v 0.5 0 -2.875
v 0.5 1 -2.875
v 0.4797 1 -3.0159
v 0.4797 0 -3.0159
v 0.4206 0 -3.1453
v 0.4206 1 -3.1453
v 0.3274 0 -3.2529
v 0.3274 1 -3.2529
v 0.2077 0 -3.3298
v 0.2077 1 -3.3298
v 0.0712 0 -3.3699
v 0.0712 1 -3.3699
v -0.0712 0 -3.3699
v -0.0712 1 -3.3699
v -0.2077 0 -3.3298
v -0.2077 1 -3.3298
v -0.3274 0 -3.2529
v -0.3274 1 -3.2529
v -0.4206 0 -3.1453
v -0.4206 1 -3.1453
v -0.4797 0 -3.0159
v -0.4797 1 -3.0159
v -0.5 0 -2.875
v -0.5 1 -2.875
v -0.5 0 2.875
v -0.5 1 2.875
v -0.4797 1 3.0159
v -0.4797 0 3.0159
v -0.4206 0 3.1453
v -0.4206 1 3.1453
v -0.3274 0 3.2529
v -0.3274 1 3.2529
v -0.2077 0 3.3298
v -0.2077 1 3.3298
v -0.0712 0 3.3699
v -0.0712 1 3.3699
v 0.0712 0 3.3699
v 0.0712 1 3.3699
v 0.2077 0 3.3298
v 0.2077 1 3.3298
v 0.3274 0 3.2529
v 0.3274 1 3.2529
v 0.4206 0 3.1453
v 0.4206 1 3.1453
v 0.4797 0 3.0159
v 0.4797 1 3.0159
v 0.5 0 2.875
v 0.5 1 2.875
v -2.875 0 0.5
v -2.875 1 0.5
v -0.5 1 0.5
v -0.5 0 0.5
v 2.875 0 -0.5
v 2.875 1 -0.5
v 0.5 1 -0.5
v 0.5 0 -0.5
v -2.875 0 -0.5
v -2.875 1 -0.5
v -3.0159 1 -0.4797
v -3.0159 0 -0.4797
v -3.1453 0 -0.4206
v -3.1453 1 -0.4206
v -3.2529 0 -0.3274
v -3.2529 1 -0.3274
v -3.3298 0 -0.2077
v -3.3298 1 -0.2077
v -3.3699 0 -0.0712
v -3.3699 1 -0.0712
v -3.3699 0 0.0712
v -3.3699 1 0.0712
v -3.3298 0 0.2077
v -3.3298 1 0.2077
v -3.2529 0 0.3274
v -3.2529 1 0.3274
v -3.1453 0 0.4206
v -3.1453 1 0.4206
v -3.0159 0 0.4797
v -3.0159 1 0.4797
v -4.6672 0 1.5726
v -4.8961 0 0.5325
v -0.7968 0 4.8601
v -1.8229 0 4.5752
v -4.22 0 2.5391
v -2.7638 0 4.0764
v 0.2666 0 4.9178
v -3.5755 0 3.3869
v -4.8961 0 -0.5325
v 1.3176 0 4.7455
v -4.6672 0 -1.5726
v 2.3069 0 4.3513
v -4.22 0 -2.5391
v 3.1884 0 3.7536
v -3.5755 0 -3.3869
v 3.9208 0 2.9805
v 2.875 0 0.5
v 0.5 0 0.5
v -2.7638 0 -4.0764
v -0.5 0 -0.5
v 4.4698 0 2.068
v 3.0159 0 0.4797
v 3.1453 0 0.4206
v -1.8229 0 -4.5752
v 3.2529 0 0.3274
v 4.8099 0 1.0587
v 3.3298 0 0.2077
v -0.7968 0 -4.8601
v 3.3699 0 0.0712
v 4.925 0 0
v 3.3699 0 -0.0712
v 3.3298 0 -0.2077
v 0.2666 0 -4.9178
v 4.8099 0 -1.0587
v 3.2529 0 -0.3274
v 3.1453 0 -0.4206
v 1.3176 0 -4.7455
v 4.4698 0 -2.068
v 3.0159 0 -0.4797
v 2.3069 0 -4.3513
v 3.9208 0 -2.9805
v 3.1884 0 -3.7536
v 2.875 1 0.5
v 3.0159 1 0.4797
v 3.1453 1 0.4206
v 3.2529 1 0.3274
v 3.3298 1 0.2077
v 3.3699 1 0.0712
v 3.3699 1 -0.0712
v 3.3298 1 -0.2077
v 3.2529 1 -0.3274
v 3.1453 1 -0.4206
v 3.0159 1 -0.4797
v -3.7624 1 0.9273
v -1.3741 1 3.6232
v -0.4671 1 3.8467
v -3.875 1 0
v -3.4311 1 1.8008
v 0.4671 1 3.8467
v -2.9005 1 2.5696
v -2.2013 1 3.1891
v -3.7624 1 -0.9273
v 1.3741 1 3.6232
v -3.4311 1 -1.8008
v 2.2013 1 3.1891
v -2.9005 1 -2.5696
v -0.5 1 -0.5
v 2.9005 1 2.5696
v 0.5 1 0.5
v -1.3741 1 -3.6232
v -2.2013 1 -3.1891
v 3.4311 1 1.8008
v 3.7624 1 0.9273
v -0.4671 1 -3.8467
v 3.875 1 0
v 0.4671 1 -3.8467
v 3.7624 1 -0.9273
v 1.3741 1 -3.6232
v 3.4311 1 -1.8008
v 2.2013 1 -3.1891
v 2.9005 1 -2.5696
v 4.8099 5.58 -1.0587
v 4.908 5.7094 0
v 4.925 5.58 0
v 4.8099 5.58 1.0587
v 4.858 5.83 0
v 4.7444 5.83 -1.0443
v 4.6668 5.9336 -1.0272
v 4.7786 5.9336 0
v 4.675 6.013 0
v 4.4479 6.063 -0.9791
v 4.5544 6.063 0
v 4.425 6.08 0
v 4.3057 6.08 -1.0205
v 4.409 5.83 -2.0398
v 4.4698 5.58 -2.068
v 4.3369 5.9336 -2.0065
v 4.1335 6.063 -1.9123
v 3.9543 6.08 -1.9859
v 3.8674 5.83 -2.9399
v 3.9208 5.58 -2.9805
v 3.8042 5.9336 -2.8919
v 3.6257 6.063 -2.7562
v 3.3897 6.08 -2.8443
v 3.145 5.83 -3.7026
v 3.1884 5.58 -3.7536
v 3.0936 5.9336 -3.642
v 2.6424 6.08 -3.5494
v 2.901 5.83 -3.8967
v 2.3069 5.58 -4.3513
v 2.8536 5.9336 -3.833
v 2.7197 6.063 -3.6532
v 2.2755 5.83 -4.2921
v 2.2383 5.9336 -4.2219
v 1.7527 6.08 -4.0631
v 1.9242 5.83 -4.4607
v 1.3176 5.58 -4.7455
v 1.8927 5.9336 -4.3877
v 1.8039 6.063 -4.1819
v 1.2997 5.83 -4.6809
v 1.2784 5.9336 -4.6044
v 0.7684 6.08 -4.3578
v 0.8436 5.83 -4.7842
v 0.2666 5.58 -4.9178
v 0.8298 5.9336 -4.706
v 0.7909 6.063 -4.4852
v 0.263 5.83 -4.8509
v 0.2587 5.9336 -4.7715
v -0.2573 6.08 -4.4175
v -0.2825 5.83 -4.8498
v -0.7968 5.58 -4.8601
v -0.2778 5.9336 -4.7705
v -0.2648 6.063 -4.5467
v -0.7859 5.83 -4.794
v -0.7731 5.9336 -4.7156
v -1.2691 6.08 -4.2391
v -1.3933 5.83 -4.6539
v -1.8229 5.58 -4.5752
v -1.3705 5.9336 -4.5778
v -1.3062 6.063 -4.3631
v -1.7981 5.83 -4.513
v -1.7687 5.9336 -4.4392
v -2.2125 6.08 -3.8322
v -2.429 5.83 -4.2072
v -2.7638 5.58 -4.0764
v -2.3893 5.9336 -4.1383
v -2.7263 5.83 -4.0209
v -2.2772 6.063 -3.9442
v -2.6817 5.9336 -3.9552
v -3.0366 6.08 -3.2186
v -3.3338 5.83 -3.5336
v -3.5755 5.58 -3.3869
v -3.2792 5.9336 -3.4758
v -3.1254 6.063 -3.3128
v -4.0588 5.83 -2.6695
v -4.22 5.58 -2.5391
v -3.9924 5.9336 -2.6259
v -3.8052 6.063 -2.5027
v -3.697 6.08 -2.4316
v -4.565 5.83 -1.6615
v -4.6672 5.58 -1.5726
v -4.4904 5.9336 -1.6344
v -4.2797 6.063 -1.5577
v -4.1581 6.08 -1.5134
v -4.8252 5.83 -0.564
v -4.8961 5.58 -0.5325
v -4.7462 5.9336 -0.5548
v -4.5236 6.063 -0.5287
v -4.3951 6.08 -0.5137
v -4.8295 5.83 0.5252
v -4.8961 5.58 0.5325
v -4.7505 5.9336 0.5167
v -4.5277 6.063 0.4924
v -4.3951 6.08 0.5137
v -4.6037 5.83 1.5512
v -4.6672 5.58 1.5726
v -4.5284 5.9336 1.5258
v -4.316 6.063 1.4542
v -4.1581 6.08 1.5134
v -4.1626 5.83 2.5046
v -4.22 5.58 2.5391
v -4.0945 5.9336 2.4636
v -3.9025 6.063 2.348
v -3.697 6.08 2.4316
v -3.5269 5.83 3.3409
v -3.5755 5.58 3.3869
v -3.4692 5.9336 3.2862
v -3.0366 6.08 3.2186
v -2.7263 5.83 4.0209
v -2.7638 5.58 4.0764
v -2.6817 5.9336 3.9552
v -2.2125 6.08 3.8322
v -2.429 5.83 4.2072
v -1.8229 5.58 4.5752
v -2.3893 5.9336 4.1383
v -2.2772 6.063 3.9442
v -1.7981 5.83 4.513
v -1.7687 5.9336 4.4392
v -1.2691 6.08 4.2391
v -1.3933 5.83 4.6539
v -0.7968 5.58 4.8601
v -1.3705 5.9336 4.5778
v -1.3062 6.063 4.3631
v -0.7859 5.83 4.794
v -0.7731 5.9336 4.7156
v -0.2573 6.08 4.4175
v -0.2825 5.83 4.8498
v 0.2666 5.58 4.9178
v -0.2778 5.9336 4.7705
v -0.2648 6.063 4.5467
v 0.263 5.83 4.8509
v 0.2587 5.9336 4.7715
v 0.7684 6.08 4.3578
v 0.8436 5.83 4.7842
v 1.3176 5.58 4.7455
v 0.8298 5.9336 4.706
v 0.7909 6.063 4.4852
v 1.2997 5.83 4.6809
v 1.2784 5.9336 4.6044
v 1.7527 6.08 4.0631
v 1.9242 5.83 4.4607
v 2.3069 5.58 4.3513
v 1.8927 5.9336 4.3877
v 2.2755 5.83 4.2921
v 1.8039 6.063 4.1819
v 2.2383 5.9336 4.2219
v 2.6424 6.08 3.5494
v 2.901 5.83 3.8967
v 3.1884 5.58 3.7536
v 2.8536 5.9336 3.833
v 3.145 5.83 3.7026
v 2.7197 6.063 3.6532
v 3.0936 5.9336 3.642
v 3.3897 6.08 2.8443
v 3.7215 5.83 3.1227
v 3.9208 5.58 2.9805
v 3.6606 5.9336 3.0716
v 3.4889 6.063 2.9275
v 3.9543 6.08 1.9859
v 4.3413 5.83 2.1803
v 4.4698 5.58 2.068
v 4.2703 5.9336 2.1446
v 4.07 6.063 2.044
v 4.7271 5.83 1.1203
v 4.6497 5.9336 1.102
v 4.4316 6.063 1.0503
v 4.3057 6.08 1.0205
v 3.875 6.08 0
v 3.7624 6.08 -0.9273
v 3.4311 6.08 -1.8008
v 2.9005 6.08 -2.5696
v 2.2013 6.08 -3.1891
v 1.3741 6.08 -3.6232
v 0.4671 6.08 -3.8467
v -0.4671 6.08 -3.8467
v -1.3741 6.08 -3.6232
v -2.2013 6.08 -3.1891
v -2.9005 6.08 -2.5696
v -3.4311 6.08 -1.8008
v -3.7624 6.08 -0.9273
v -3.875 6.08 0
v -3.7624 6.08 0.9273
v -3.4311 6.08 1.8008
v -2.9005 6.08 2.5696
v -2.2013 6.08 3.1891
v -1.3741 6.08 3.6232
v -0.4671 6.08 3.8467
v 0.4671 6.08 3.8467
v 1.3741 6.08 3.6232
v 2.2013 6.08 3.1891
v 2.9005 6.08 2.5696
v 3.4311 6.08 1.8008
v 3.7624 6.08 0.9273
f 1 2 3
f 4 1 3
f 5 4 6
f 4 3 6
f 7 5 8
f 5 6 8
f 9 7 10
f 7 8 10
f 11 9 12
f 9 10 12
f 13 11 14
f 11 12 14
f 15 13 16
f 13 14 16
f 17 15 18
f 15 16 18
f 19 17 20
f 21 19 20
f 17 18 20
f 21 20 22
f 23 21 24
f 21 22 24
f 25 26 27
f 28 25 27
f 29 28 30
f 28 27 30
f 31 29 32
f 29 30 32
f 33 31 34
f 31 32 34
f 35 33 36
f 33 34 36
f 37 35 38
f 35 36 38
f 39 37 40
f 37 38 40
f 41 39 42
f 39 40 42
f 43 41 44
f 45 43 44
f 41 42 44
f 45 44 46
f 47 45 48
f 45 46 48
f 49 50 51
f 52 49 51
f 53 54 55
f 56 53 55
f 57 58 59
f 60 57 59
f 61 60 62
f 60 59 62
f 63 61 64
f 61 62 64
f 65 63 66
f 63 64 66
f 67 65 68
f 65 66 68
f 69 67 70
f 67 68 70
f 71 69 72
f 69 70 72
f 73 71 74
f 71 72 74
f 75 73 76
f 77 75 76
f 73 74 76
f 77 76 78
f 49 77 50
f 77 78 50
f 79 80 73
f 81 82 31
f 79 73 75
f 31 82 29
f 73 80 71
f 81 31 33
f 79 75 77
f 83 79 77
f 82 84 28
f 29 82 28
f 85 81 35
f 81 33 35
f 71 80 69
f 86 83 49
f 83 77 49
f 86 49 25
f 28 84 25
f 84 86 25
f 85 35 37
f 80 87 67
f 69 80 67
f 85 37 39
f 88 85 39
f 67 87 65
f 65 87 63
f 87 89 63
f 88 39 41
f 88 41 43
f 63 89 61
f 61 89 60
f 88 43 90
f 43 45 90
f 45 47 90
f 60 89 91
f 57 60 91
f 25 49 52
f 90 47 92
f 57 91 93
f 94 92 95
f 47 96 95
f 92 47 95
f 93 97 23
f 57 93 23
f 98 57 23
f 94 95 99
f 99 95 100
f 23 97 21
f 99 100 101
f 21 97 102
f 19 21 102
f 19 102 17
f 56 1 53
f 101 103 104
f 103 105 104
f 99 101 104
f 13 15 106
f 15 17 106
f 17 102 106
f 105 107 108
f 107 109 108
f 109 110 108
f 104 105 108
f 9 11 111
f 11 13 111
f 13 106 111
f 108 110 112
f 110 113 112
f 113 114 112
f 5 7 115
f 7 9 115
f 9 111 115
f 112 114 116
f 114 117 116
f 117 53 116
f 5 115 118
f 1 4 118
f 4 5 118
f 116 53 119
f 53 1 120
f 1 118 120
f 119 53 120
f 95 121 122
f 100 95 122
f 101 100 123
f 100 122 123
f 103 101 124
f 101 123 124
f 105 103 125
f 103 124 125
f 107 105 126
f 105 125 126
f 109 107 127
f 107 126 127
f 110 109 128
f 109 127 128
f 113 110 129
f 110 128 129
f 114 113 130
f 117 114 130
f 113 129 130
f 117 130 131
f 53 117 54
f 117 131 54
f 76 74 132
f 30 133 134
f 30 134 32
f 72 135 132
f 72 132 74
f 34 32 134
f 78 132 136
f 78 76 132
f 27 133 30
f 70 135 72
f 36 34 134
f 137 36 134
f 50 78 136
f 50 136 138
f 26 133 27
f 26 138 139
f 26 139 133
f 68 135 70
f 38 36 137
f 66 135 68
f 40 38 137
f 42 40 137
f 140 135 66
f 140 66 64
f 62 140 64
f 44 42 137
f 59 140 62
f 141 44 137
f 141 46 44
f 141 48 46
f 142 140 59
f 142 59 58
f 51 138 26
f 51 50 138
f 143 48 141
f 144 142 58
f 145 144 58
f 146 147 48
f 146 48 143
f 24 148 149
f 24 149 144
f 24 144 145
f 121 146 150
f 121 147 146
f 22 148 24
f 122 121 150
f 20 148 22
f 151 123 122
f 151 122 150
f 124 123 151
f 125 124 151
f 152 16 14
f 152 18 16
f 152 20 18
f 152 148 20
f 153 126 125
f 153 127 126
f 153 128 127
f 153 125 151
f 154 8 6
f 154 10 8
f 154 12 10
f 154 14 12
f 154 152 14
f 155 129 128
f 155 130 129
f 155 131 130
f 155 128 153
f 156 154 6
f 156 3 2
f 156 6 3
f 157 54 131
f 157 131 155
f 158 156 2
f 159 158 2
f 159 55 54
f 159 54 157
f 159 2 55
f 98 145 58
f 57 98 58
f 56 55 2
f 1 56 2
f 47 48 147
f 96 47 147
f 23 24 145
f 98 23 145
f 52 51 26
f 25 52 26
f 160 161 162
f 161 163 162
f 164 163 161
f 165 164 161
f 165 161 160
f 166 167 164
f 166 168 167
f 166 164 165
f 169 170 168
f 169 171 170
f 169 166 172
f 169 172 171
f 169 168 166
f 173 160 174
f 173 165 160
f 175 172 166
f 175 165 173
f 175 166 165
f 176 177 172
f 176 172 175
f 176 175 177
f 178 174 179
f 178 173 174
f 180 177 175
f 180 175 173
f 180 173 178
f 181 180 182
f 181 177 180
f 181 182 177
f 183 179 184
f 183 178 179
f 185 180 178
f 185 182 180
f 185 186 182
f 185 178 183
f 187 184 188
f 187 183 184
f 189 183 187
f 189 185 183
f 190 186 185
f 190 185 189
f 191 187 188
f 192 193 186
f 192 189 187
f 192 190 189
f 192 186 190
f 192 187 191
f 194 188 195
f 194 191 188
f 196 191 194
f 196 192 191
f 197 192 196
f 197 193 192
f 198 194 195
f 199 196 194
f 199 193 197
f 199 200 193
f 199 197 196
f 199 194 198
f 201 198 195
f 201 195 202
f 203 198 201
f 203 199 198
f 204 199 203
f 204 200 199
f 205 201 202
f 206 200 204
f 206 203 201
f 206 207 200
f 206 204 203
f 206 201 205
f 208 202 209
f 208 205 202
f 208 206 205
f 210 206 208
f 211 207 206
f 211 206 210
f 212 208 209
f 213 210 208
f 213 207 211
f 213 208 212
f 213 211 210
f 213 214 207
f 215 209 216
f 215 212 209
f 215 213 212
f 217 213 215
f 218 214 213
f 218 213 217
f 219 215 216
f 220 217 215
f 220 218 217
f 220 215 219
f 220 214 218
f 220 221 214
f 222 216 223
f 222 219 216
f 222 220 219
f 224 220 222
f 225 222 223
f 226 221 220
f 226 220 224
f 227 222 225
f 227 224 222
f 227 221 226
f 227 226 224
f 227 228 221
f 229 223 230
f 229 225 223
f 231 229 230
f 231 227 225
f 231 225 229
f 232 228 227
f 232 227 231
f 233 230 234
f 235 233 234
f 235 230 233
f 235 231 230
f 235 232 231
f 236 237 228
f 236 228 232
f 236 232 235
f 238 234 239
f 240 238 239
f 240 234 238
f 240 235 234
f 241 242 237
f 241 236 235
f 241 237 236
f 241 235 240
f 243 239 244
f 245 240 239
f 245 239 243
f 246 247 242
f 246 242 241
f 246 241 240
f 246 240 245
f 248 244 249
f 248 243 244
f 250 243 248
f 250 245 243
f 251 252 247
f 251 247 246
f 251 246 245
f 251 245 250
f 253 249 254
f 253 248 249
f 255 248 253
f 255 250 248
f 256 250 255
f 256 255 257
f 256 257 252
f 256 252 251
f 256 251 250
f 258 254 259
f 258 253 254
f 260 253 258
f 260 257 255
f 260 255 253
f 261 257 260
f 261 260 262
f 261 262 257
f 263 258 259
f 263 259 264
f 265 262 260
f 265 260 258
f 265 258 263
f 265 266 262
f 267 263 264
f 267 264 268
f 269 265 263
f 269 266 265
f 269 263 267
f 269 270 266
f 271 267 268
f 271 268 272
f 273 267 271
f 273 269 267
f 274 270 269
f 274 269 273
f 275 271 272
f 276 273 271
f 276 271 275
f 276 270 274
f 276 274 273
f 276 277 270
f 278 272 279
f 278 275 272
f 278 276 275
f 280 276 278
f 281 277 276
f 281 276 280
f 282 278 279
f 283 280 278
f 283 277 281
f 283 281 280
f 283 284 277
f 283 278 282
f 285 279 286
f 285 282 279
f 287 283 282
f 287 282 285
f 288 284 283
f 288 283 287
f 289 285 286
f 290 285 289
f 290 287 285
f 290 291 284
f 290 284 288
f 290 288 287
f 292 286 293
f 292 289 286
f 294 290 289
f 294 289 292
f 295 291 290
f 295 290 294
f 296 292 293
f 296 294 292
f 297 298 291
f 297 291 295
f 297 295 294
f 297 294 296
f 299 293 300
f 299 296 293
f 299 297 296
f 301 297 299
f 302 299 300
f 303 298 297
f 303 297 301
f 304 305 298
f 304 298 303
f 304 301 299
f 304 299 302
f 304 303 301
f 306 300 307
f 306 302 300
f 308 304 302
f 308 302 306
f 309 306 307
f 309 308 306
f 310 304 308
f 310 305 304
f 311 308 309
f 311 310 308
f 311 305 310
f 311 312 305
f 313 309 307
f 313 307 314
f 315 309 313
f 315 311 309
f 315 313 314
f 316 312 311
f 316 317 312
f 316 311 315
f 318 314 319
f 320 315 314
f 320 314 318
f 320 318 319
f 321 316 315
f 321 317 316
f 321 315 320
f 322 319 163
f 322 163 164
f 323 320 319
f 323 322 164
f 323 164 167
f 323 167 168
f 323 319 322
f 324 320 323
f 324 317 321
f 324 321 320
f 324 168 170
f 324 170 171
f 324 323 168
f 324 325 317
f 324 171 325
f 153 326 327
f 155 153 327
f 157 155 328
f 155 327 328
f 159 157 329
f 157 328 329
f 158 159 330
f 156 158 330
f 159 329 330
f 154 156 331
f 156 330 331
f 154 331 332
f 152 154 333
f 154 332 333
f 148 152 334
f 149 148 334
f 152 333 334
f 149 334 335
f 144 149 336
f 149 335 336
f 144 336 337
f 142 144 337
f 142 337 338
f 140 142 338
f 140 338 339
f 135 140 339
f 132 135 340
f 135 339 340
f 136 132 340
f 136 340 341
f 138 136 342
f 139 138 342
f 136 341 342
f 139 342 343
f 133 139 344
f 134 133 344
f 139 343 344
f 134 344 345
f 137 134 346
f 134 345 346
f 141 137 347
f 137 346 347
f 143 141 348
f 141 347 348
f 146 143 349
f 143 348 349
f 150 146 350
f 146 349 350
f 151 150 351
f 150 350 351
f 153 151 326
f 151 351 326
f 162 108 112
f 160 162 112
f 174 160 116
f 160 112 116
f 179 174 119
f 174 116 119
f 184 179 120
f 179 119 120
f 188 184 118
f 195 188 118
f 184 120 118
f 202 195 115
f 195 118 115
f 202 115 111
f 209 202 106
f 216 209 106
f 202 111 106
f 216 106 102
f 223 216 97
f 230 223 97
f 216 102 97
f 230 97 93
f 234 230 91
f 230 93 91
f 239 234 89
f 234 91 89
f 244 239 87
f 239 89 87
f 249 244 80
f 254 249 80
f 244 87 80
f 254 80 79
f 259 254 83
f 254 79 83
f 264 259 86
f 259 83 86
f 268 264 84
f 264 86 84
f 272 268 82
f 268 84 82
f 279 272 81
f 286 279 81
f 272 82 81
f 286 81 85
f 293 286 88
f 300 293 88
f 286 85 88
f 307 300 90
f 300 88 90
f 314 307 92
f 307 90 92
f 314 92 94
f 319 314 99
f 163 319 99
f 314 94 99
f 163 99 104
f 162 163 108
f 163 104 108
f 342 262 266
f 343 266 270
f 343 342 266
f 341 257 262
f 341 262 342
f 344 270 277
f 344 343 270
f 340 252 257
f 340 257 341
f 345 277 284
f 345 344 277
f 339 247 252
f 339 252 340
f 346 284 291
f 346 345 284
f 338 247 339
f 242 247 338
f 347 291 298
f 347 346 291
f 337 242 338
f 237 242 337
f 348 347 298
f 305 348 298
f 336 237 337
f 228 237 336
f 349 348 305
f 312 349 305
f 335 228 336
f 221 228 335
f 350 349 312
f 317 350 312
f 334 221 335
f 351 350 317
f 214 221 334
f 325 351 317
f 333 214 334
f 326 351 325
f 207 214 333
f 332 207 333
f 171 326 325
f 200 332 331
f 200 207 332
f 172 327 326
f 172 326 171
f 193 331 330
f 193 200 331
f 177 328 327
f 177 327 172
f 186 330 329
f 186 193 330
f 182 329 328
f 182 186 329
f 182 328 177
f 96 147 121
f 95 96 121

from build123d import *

# Parameters (mm, degrees)
SKETCH_1_R          = 4.925
EXTRUDE_1_DEPTH     = 6.08
SKETCH_2_R          = 3.875
CUT_EXTRUDE_1_DEPTH = 5.08
FILLET_1_R          = 0.5
CUT_EXTRUDE_2_DEPTH = 2


with BuildPart() as part:
    # Эскиз1 → Бобышка-Вытянуть1 (new body)
    with BuildSketch(Plane(origin=(0, 0, 0), x_dir=(1, 0, 0), z_dir=(0, 1, 0))):
        Circle(SKETCH_1_R)
    extrude(amount=EXTRUDE_1_DEPTH)

    # Эскиз2 → Вырез-Вытянуть1 (cut)
    with BuildSketch(Plane(origin=(0, 6.08, 0), x_dir=(1, 0, 0), z_dir=(0, 1, 0))):
        Circle(SKETCH_2_R)
    extrude(amount=-CUT_EXTRUDE_1_DEPTH, mode=Mode.SUBTRACT)

    # Скругление1
    fillet_1_edges = [part.edges().sort_by_distance(p)[0] for p in [
        (-4.925, 6.08, 0),
    ]]
    fillet(fillet_1_edges, radius=FILLET_1_R)

    # Эскиз3 → Вырез-Вытянуть2 (cut, through all)
    with BuildSketch(Plane(origin=(0, 1, 0), x_dir=(1, 0, 0), z_dir=(0, 1, 0))):
        with BuildLine():
            Line((2.875, 0.5), (0.5, 0.5))
            Line((0.5, 0.5), (0.5, 2.875))
            ThreePointArc((0.5, 2.875), (0, 3.375), (-0.5, 2.875))
            Line((-0.5, 2.875), (-0.5, 0.5))
            Line((-0.5, 0.5), (-2.875, 0.5))
            ThreePointArc((-2.875, 0.5), (-3.375, 0), (-2.875, -0.5))
            Line((-2.875, -0.5), (-0.5, -0.5))
            Line((-0.5, -0.5), (-0.5, -2.875))
            ThreePointArc((-0.5, -2.875), (0, -3.375), (0.5, -2.875))
            Line((0.5, -2.875), (0.5, -0.5))
            Line((0.5, -0.5), (2.875, -0.5))
            ThreePointArc((2.875, -0.5), (3.375, 0), (2.875, 0.5))
        make_face()
    extrude(amount=-CUT_EXTRUDE_2_DEPTH, mode=Mode.SUBTRACT)


solid = part.part
